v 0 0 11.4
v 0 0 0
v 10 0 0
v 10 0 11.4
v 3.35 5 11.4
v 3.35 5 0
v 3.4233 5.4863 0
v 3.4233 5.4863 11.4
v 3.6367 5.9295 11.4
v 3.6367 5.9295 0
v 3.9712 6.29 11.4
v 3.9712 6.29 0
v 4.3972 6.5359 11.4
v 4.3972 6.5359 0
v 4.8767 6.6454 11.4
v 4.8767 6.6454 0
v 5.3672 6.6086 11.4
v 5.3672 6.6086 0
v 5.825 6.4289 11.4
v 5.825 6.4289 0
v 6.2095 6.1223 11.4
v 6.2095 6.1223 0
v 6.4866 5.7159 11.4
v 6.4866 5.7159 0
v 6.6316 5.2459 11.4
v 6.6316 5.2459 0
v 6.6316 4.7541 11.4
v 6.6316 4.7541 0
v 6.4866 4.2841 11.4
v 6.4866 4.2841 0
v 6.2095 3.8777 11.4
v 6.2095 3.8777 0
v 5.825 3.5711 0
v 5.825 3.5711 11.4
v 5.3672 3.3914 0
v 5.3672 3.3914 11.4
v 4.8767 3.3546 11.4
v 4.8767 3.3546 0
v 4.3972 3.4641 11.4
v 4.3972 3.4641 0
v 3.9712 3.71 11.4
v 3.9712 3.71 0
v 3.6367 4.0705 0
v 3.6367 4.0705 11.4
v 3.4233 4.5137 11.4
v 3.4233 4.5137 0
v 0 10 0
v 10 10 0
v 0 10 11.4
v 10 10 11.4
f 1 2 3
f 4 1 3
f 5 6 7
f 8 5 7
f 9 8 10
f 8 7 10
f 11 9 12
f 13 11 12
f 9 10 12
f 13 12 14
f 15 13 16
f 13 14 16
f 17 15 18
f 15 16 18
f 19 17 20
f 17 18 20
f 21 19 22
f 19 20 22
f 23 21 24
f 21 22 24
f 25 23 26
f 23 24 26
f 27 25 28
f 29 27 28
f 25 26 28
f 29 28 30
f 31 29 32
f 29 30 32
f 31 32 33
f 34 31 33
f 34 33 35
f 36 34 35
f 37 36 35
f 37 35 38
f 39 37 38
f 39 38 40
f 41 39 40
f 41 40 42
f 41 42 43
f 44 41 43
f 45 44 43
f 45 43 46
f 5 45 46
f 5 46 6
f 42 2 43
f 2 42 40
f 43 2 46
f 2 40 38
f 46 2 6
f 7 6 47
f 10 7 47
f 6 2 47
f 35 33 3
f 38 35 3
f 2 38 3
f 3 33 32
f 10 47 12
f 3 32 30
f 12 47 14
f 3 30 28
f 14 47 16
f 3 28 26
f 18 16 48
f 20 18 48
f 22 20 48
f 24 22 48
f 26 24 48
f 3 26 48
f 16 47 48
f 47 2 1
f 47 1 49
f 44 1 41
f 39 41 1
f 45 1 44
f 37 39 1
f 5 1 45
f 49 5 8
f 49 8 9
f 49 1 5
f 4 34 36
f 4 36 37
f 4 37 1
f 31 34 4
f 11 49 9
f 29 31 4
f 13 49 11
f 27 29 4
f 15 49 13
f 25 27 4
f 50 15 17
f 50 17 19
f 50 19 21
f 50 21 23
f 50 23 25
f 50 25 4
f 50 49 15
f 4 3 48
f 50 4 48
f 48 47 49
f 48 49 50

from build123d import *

# Parameters (mm, degrees)
SKETCH_1_W         = 10
SKETCH_1_H         = 10
EXTRUDE_1_DEPTH    = 11.4
HOLE_WIZARD_M4_1_D = 3.3


with BuildPart() as part:
    # 草图1 → 凸台-拉伸1 (new body)
    with BuildSketch(Plane.XY):
        with Locations((5, 5)):
            Rectangle(SKETCH_1_W, SKETCH_1_H)
    extrude(amount=EXTRUDE_1_DEPTH)

    # M4 螺纹孔1 (through all)
    with Locations(Plane.XY.offset(11.4)):
        with Locations((5, 5)):
            Hole(HOLE_WIZARD_M4_1_D / 2)


solid = part.part
